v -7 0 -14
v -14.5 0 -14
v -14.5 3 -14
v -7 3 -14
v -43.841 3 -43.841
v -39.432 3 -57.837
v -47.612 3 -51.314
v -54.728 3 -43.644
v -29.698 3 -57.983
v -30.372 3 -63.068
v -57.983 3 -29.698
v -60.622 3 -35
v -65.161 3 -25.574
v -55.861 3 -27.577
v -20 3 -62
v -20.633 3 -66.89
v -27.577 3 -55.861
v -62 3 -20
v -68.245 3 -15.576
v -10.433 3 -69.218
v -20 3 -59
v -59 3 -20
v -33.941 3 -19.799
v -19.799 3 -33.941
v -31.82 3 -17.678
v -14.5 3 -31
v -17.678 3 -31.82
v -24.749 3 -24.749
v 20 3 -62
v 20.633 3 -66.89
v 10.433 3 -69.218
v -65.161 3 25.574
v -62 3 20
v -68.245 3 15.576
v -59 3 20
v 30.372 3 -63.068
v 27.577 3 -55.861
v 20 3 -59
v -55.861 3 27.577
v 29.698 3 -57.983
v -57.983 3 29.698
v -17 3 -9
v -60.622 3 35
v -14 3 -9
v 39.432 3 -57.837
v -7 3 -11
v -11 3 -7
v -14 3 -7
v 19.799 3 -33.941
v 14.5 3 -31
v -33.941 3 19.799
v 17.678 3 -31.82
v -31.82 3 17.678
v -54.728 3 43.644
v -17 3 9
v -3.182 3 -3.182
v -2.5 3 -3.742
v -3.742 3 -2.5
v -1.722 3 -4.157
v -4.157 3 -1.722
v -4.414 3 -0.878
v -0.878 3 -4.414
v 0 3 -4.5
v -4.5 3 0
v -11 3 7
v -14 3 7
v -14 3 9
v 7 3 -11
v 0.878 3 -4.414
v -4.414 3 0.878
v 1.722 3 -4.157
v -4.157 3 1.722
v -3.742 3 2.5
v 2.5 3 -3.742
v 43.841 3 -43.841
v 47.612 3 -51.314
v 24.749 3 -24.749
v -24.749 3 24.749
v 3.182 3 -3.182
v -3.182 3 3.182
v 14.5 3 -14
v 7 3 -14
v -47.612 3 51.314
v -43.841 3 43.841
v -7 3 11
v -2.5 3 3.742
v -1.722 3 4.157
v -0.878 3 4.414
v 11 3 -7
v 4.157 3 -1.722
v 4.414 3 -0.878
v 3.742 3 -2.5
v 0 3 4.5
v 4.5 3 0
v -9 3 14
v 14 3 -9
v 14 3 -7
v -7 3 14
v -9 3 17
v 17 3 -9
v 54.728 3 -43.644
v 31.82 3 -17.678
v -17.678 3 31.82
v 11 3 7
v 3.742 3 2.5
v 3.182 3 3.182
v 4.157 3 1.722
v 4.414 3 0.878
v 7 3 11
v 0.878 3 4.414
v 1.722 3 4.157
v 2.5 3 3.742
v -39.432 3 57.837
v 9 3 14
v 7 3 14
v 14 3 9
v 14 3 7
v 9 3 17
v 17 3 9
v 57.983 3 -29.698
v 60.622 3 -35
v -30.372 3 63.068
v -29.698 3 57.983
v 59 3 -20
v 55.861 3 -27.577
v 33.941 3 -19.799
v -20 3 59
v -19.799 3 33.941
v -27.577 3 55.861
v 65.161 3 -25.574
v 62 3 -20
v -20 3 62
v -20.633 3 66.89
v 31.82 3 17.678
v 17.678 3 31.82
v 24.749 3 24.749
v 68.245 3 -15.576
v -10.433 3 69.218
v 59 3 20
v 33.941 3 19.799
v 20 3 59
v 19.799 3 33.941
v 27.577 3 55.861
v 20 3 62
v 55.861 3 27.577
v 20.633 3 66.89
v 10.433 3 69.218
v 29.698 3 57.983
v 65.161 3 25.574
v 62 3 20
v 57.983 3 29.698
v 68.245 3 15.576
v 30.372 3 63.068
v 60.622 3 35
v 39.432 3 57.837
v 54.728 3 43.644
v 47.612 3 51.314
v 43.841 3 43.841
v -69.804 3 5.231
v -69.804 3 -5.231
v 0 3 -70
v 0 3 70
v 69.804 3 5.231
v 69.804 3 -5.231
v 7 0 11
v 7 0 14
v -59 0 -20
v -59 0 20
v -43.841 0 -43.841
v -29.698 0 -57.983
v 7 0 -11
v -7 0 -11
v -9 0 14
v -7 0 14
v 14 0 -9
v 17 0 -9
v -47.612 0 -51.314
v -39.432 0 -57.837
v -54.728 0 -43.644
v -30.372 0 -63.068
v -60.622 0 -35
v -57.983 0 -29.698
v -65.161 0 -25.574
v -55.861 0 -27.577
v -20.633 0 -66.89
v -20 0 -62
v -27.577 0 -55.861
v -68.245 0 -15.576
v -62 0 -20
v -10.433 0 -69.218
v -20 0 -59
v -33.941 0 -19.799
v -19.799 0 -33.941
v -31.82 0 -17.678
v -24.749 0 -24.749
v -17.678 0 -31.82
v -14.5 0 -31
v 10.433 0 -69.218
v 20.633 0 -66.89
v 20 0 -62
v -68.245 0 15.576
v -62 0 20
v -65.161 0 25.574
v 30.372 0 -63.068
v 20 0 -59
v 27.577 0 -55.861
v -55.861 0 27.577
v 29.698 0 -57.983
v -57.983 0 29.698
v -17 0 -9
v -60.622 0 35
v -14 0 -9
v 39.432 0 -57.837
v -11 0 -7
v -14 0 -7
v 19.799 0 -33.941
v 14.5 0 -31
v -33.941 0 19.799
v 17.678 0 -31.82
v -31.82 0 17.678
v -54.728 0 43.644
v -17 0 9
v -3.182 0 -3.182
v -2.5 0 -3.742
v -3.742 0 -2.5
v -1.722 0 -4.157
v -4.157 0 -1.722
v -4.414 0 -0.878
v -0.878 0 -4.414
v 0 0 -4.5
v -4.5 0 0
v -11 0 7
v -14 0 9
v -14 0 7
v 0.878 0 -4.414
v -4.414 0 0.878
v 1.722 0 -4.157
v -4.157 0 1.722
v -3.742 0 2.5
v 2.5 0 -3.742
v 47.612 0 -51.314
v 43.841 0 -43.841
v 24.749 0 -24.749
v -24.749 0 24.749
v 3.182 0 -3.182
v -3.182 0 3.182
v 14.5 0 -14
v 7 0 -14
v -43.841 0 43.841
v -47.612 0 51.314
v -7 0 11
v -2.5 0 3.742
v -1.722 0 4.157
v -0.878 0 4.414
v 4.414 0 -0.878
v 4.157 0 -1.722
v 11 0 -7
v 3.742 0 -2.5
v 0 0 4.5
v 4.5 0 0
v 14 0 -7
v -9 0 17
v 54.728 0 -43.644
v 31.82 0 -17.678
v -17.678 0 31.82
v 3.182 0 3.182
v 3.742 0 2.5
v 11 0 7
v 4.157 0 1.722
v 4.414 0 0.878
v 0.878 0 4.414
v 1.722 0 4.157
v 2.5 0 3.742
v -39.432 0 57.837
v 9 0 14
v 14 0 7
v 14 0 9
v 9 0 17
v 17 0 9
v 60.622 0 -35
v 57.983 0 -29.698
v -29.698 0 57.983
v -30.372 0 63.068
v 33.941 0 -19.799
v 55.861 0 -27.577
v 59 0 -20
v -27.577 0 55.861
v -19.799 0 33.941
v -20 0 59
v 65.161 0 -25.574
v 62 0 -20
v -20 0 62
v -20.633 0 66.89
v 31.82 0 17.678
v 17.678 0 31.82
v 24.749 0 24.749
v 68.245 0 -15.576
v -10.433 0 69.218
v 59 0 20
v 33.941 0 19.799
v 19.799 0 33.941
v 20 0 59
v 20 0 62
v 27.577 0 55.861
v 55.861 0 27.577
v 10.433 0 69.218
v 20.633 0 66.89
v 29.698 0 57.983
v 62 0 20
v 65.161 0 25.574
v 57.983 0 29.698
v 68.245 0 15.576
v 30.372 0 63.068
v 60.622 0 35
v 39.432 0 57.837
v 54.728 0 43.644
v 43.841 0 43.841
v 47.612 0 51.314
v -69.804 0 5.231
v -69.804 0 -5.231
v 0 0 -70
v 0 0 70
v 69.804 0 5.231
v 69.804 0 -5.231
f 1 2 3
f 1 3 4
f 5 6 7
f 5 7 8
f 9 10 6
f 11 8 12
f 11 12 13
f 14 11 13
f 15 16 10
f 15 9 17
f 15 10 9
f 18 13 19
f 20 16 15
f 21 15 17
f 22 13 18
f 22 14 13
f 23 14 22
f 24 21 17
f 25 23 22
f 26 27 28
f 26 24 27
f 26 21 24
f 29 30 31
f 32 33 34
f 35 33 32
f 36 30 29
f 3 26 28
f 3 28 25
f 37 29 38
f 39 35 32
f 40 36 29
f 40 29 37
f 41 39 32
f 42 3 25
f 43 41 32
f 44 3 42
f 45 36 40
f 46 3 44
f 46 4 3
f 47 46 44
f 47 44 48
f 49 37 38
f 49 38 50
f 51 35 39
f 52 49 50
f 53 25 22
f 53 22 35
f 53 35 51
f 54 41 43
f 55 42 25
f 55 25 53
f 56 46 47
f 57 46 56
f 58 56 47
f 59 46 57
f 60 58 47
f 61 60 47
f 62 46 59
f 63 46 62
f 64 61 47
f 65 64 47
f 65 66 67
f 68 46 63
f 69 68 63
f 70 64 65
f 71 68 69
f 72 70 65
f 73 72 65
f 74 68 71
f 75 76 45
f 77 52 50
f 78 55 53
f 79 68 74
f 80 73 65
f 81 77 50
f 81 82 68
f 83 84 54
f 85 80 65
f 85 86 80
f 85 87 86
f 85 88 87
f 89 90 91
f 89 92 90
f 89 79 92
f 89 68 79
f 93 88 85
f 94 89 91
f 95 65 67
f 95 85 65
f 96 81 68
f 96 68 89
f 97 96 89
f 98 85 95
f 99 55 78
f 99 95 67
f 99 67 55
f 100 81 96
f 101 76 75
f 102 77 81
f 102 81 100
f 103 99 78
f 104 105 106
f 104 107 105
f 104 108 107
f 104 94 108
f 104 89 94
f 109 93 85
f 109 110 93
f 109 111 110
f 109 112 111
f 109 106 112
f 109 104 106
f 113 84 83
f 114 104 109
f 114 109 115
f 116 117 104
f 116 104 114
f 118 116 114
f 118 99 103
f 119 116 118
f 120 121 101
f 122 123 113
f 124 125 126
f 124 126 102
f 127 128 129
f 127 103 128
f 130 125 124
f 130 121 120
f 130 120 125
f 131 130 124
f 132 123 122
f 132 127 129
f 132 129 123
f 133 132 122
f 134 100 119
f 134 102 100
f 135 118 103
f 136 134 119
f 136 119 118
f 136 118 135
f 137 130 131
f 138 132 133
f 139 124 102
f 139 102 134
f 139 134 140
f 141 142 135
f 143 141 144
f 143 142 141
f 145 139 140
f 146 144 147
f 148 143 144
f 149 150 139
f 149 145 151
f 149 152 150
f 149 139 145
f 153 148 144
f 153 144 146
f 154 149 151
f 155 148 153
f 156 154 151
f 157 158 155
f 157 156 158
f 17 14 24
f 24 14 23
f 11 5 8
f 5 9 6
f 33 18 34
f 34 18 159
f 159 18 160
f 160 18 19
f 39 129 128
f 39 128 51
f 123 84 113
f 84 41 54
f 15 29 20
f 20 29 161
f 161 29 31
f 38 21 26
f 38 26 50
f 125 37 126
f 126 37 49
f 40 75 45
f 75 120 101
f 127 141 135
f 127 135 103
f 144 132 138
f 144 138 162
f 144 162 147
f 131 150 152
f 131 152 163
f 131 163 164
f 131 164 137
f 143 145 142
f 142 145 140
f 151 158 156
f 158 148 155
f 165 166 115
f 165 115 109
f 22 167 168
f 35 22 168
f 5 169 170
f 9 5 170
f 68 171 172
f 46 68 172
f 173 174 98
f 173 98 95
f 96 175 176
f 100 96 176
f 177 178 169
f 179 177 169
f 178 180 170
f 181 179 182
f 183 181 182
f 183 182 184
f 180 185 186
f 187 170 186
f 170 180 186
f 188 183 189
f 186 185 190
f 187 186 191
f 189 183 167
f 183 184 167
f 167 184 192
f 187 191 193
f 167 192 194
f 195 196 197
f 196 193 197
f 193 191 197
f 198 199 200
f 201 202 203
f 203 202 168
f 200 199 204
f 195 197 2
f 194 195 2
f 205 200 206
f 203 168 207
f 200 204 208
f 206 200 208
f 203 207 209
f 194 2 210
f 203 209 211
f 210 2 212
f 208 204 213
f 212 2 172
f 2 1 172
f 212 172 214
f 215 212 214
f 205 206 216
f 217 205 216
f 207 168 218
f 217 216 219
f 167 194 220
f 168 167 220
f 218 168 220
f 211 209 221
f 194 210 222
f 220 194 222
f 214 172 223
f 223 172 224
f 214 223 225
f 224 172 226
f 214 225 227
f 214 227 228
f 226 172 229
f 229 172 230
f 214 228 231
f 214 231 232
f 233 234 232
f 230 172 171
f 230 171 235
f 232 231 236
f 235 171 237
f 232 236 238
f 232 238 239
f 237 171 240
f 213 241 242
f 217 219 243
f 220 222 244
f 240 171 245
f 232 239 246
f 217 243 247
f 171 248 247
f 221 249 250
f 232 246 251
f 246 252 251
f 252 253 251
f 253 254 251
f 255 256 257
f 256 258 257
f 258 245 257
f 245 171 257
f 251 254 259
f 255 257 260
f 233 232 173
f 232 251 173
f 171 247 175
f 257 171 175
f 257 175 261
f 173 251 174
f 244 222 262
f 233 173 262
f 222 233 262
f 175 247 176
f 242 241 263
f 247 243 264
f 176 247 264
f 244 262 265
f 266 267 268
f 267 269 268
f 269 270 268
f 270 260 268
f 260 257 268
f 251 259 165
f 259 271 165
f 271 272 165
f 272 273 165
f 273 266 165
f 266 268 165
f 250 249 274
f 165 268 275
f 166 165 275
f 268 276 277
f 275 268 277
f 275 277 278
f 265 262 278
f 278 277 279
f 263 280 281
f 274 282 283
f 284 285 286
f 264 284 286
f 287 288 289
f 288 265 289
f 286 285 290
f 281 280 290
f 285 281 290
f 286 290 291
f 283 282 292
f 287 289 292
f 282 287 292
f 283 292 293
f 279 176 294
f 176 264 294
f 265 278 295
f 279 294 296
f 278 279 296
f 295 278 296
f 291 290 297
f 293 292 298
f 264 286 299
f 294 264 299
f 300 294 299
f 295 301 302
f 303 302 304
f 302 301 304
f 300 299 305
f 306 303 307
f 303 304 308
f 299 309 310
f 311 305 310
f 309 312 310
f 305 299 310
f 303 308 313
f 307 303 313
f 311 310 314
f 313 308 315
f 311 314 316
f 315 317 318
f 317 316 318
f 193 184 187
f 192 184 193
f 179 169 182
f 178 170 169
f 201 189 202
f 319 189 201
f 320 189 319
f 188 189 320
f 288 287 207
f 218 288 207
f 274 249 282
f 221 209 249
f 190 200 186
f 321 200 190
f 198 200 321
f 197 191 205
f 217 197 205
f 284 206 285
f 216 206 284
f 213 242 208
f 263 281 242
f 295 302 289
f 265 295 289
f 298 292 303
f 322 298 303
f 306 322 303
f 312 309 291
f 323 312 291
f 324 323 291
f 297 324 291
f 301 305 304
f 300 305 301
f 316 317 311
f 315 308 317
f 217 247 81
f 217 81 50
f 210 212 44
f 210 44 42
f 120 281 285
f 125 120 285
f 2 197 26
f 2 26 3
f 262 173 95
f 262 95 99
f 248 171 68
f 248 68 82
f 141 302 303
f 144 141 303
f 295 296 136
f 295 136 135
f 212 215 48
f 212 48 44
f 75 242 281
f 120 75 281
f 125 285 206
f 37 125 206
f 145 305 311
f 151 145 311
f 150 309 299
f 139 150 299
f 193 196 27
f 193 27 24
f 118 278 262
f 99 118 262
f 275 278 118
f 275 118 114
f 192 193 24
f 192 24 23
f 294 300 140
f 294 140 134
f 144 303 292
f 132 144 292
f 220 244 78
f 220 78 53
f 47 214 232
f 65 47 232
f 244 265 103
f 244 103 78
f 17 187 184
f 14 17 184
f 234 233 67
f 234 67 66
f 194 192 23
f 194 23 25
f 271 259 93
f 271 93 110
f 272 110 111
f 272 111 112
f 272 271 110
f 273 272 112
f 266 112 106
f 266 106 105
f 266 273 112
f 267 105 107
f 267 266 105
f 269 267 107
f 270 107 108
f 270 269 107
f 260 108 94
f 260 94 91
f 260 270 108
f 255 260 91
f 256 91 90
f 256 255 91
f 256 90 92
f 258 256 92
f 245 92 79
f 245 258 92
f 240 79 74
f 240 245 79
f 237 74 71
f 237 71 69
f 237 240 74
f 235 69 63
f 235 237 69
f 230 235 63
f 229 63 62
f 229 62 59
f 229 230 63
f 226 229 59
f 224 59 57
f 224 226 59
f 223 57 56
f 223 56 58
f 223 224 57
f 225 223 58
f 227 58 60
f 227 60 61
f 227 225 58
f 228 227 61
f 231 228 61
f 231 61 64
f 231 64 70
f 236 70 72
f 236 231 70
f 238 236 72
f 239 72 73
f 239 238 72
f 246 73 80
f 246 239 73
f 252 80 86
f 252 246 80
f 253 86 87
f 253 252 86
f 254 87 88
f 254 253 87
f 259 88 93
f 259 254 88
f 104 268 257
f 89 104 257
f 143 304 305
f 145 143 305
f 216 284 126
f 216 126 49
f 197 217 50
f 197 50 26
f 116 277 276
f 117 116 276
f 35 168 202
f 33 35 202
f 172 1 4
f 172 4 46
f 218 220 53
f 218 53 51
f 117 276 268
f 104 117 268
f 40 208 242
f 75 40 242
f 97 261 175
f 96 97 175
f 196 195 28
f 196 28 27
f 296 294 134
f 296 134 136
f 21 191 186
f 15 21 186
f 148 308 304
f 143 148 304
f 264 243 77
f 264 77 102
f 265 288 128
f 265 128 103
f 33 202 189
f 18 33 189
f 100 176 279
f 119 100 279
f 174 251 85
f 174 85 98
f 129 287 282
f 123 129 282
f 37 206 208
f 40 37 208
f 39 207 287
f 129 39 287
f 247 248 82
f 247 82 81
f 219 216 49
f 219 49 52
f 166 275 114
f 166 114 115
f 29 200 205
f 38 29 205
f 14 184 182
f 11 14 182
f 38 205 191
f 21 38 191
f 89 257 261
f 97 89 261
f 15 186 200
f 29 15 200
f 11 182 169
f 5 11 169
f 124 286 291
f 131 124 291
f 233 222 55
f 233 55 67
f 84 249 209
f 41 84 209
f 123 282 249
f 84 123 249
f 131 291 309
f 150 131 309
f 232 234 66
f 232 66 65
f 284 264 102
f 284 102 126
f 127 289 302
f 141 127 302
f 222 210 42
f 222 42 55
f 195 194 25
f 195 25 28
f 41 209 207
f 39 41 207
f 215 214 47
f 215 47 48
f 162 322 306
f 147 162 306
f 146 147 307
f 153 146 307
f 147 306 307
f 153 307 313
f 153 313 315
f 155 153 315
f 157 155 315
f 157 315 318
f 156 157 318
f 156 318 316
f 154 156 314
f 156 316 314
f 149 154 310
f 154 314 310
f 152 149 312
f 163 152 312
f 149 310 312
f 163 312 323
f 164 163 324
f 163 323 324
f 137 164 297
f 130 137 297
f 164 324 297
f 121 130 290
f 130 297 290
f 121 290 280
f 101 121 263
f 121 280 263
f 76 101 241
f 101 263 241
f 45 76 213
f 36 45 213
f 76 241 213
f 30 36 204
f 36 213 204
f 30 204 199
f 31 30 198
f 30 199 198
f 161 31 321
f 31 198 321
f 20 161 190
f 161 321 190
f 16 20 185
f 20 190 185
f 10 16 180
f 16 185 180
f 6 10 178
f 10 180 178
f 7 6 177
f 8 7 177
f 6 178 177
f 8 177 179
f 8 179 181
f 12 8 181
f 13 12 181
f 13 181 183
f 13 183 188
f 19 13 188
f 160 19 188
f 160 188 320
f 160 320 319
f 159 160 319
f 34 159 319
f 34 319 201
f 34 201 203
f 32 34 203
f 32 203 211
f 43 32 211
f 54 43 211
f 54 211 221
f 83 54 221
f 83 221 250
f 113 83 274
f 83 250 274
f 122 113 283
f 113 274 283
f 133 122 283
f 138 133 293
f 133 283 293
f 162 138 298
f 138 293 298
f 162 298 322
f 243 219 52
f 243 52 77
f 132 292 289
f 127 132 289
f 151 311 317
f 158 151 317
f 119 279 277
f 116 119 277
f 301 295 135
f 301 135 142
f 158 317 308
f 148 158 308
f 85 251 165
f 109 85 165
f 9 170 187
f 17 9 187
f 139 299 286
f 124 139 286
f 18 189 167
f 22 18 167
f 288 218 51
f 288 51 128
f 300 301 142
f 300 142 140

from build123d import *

# Parameters (mm, degrees)
CROQUIS1_R              = 70
CROQUIS1_R_2            = 4.5
SALIENTE_EXTRUIR1_DEPTH = 3


with BuildPart() as part:
    # Croquis1 → Saliente-Extruir1 (new body)
    with BuildSketch(Plane(origin=(0, 0, 0), x_dir=(1, 0, 0), z_dir=(0, 1, 0))):
        with Locations(Location((0, 0, 0), (0, 0, 270))):
            Circle(CROQUIS1_R)
        with Locations(Location((0, 0, 0), (0, 0, 270))):
            Circle(CROQUIS1_R_2, mode=Mode.SUBTRACT)
        Polygon((0, 11), (7, 11), (7, 14), (14.5, 14), (14.5, 31), (-14.5, 31), (-14.5, 14), (-7, 14), (-7, 11), align=None, mode=Mode.SUBTRACT)
        Polygon((24.748737342, 24.748737342), (31.819805153, 17.67766953), (33.941125497, 19.798989873), (19.798989873, 33.941125497), (17.67766953, 31.819805153), align=None, mode=Mode.SUBTRACT)
        Polygon((11, 0), (11, 7), (14, 7), (14, 9), (17, 9), (17, 0), (17, -9), (14, -9), (14, -7), (11, -7), align=None, mode=Mode.SUBTRACT)
        Polygon((-24.748737342, 24.748737342), (-17.67766953, 31.819805153), (-19.798989873, 33.941125497), (-33.941125497, 19.798989873), (-31.819805153, 17.67766953), align=None, mode=Mode.SUBTRACT)
        Polygon((-14, -7), (-11, -7), (-11, 0), (-11, 7), (-14, 7), (-14, 9), (-17, 9), (-17, -9), (-14, -9), align=None, mode=Mode.SUBTRACT)
        Polygon((-7, -14), (-9, -14), (-9, -17), (0, -17), (9, -17), (9, -14), (7, -14), (7, -11), (0, -11), (-7, -11), align=None, mode=Mode.SUBTRACT)
        Polygon((24.748737342, -24.748737342), (17.67766953, -31.819805153), (19.798989873, -33.941125497), (33.941125497, -19.798989873), (31.819805153, -17.67766953), align=None, mode=Mode.SUBTRACT)
        Polygon((-24.748737342, -24.748737342), (-31.819805153, -17.67766953), (-33.941125497, -19.798989873), (-19.798989873, -33.941125497), (-17.67766953, -31.819805153), align=None, mode=Mode.SUBTRACT)
        Polygon((0, 62), (20, 62), (20, 59), (-20, 59), (-20, 62), align=None, mode=Mode.SUBTRACT)
        Polygon((55.861435714, 27.577164466), (27.577164466, 55.861435714), (29.69848481, 57.982756057), (43.840620434, 43.840620434), (57.982756057, 29.69848481), align=None, mode=Mode.SUBTRACT)
        Polygon((59, -20), (59, 20), (62, 20), (62, 0), (62, -20), align=None, mode=Mode.SUBTRACT)
        Polygon((27.577164466, -55.861435714), (55.861435714, -27.577164466), (57.982756057, -29.69848481), (43.840620434, -43.840620434), (29.69848481, -57.982756057), align=None, mode=Mode.SUBTRACT)
        Polygon((-20, -59), (20, -59), (20, -62), (0, -62), (-20, -62), align=None, mode=Mode.SUBTRACT)
        Polygon((-55.861435714, -27.577164466), (-27.577164466, -55.861435714), (-29.69848481, -57.982756057), (-43.840620434, -43.840620434), (-57.982756057, -29.69848481), align=None, mode=Mode.SUBTRACT)
        Polygon((-59, 20), (-59, -20), (-62, -20), (-62, 0), (-62, 20), align=None, mode=Mode.SUBTRACT)
        Polygon((-27.577164466, 55.861435714), (-55.861435714, 27.577164466), (-57.982756057, 29.69848481), (-43.840620434, 43.840620434), (-29.69848481, 57.982756057), align=None, mode=Mode.SUBTRACT)
    extrude(amount=SALIENTE_EXTRUIR1_DEPTH)


solid = part.part
